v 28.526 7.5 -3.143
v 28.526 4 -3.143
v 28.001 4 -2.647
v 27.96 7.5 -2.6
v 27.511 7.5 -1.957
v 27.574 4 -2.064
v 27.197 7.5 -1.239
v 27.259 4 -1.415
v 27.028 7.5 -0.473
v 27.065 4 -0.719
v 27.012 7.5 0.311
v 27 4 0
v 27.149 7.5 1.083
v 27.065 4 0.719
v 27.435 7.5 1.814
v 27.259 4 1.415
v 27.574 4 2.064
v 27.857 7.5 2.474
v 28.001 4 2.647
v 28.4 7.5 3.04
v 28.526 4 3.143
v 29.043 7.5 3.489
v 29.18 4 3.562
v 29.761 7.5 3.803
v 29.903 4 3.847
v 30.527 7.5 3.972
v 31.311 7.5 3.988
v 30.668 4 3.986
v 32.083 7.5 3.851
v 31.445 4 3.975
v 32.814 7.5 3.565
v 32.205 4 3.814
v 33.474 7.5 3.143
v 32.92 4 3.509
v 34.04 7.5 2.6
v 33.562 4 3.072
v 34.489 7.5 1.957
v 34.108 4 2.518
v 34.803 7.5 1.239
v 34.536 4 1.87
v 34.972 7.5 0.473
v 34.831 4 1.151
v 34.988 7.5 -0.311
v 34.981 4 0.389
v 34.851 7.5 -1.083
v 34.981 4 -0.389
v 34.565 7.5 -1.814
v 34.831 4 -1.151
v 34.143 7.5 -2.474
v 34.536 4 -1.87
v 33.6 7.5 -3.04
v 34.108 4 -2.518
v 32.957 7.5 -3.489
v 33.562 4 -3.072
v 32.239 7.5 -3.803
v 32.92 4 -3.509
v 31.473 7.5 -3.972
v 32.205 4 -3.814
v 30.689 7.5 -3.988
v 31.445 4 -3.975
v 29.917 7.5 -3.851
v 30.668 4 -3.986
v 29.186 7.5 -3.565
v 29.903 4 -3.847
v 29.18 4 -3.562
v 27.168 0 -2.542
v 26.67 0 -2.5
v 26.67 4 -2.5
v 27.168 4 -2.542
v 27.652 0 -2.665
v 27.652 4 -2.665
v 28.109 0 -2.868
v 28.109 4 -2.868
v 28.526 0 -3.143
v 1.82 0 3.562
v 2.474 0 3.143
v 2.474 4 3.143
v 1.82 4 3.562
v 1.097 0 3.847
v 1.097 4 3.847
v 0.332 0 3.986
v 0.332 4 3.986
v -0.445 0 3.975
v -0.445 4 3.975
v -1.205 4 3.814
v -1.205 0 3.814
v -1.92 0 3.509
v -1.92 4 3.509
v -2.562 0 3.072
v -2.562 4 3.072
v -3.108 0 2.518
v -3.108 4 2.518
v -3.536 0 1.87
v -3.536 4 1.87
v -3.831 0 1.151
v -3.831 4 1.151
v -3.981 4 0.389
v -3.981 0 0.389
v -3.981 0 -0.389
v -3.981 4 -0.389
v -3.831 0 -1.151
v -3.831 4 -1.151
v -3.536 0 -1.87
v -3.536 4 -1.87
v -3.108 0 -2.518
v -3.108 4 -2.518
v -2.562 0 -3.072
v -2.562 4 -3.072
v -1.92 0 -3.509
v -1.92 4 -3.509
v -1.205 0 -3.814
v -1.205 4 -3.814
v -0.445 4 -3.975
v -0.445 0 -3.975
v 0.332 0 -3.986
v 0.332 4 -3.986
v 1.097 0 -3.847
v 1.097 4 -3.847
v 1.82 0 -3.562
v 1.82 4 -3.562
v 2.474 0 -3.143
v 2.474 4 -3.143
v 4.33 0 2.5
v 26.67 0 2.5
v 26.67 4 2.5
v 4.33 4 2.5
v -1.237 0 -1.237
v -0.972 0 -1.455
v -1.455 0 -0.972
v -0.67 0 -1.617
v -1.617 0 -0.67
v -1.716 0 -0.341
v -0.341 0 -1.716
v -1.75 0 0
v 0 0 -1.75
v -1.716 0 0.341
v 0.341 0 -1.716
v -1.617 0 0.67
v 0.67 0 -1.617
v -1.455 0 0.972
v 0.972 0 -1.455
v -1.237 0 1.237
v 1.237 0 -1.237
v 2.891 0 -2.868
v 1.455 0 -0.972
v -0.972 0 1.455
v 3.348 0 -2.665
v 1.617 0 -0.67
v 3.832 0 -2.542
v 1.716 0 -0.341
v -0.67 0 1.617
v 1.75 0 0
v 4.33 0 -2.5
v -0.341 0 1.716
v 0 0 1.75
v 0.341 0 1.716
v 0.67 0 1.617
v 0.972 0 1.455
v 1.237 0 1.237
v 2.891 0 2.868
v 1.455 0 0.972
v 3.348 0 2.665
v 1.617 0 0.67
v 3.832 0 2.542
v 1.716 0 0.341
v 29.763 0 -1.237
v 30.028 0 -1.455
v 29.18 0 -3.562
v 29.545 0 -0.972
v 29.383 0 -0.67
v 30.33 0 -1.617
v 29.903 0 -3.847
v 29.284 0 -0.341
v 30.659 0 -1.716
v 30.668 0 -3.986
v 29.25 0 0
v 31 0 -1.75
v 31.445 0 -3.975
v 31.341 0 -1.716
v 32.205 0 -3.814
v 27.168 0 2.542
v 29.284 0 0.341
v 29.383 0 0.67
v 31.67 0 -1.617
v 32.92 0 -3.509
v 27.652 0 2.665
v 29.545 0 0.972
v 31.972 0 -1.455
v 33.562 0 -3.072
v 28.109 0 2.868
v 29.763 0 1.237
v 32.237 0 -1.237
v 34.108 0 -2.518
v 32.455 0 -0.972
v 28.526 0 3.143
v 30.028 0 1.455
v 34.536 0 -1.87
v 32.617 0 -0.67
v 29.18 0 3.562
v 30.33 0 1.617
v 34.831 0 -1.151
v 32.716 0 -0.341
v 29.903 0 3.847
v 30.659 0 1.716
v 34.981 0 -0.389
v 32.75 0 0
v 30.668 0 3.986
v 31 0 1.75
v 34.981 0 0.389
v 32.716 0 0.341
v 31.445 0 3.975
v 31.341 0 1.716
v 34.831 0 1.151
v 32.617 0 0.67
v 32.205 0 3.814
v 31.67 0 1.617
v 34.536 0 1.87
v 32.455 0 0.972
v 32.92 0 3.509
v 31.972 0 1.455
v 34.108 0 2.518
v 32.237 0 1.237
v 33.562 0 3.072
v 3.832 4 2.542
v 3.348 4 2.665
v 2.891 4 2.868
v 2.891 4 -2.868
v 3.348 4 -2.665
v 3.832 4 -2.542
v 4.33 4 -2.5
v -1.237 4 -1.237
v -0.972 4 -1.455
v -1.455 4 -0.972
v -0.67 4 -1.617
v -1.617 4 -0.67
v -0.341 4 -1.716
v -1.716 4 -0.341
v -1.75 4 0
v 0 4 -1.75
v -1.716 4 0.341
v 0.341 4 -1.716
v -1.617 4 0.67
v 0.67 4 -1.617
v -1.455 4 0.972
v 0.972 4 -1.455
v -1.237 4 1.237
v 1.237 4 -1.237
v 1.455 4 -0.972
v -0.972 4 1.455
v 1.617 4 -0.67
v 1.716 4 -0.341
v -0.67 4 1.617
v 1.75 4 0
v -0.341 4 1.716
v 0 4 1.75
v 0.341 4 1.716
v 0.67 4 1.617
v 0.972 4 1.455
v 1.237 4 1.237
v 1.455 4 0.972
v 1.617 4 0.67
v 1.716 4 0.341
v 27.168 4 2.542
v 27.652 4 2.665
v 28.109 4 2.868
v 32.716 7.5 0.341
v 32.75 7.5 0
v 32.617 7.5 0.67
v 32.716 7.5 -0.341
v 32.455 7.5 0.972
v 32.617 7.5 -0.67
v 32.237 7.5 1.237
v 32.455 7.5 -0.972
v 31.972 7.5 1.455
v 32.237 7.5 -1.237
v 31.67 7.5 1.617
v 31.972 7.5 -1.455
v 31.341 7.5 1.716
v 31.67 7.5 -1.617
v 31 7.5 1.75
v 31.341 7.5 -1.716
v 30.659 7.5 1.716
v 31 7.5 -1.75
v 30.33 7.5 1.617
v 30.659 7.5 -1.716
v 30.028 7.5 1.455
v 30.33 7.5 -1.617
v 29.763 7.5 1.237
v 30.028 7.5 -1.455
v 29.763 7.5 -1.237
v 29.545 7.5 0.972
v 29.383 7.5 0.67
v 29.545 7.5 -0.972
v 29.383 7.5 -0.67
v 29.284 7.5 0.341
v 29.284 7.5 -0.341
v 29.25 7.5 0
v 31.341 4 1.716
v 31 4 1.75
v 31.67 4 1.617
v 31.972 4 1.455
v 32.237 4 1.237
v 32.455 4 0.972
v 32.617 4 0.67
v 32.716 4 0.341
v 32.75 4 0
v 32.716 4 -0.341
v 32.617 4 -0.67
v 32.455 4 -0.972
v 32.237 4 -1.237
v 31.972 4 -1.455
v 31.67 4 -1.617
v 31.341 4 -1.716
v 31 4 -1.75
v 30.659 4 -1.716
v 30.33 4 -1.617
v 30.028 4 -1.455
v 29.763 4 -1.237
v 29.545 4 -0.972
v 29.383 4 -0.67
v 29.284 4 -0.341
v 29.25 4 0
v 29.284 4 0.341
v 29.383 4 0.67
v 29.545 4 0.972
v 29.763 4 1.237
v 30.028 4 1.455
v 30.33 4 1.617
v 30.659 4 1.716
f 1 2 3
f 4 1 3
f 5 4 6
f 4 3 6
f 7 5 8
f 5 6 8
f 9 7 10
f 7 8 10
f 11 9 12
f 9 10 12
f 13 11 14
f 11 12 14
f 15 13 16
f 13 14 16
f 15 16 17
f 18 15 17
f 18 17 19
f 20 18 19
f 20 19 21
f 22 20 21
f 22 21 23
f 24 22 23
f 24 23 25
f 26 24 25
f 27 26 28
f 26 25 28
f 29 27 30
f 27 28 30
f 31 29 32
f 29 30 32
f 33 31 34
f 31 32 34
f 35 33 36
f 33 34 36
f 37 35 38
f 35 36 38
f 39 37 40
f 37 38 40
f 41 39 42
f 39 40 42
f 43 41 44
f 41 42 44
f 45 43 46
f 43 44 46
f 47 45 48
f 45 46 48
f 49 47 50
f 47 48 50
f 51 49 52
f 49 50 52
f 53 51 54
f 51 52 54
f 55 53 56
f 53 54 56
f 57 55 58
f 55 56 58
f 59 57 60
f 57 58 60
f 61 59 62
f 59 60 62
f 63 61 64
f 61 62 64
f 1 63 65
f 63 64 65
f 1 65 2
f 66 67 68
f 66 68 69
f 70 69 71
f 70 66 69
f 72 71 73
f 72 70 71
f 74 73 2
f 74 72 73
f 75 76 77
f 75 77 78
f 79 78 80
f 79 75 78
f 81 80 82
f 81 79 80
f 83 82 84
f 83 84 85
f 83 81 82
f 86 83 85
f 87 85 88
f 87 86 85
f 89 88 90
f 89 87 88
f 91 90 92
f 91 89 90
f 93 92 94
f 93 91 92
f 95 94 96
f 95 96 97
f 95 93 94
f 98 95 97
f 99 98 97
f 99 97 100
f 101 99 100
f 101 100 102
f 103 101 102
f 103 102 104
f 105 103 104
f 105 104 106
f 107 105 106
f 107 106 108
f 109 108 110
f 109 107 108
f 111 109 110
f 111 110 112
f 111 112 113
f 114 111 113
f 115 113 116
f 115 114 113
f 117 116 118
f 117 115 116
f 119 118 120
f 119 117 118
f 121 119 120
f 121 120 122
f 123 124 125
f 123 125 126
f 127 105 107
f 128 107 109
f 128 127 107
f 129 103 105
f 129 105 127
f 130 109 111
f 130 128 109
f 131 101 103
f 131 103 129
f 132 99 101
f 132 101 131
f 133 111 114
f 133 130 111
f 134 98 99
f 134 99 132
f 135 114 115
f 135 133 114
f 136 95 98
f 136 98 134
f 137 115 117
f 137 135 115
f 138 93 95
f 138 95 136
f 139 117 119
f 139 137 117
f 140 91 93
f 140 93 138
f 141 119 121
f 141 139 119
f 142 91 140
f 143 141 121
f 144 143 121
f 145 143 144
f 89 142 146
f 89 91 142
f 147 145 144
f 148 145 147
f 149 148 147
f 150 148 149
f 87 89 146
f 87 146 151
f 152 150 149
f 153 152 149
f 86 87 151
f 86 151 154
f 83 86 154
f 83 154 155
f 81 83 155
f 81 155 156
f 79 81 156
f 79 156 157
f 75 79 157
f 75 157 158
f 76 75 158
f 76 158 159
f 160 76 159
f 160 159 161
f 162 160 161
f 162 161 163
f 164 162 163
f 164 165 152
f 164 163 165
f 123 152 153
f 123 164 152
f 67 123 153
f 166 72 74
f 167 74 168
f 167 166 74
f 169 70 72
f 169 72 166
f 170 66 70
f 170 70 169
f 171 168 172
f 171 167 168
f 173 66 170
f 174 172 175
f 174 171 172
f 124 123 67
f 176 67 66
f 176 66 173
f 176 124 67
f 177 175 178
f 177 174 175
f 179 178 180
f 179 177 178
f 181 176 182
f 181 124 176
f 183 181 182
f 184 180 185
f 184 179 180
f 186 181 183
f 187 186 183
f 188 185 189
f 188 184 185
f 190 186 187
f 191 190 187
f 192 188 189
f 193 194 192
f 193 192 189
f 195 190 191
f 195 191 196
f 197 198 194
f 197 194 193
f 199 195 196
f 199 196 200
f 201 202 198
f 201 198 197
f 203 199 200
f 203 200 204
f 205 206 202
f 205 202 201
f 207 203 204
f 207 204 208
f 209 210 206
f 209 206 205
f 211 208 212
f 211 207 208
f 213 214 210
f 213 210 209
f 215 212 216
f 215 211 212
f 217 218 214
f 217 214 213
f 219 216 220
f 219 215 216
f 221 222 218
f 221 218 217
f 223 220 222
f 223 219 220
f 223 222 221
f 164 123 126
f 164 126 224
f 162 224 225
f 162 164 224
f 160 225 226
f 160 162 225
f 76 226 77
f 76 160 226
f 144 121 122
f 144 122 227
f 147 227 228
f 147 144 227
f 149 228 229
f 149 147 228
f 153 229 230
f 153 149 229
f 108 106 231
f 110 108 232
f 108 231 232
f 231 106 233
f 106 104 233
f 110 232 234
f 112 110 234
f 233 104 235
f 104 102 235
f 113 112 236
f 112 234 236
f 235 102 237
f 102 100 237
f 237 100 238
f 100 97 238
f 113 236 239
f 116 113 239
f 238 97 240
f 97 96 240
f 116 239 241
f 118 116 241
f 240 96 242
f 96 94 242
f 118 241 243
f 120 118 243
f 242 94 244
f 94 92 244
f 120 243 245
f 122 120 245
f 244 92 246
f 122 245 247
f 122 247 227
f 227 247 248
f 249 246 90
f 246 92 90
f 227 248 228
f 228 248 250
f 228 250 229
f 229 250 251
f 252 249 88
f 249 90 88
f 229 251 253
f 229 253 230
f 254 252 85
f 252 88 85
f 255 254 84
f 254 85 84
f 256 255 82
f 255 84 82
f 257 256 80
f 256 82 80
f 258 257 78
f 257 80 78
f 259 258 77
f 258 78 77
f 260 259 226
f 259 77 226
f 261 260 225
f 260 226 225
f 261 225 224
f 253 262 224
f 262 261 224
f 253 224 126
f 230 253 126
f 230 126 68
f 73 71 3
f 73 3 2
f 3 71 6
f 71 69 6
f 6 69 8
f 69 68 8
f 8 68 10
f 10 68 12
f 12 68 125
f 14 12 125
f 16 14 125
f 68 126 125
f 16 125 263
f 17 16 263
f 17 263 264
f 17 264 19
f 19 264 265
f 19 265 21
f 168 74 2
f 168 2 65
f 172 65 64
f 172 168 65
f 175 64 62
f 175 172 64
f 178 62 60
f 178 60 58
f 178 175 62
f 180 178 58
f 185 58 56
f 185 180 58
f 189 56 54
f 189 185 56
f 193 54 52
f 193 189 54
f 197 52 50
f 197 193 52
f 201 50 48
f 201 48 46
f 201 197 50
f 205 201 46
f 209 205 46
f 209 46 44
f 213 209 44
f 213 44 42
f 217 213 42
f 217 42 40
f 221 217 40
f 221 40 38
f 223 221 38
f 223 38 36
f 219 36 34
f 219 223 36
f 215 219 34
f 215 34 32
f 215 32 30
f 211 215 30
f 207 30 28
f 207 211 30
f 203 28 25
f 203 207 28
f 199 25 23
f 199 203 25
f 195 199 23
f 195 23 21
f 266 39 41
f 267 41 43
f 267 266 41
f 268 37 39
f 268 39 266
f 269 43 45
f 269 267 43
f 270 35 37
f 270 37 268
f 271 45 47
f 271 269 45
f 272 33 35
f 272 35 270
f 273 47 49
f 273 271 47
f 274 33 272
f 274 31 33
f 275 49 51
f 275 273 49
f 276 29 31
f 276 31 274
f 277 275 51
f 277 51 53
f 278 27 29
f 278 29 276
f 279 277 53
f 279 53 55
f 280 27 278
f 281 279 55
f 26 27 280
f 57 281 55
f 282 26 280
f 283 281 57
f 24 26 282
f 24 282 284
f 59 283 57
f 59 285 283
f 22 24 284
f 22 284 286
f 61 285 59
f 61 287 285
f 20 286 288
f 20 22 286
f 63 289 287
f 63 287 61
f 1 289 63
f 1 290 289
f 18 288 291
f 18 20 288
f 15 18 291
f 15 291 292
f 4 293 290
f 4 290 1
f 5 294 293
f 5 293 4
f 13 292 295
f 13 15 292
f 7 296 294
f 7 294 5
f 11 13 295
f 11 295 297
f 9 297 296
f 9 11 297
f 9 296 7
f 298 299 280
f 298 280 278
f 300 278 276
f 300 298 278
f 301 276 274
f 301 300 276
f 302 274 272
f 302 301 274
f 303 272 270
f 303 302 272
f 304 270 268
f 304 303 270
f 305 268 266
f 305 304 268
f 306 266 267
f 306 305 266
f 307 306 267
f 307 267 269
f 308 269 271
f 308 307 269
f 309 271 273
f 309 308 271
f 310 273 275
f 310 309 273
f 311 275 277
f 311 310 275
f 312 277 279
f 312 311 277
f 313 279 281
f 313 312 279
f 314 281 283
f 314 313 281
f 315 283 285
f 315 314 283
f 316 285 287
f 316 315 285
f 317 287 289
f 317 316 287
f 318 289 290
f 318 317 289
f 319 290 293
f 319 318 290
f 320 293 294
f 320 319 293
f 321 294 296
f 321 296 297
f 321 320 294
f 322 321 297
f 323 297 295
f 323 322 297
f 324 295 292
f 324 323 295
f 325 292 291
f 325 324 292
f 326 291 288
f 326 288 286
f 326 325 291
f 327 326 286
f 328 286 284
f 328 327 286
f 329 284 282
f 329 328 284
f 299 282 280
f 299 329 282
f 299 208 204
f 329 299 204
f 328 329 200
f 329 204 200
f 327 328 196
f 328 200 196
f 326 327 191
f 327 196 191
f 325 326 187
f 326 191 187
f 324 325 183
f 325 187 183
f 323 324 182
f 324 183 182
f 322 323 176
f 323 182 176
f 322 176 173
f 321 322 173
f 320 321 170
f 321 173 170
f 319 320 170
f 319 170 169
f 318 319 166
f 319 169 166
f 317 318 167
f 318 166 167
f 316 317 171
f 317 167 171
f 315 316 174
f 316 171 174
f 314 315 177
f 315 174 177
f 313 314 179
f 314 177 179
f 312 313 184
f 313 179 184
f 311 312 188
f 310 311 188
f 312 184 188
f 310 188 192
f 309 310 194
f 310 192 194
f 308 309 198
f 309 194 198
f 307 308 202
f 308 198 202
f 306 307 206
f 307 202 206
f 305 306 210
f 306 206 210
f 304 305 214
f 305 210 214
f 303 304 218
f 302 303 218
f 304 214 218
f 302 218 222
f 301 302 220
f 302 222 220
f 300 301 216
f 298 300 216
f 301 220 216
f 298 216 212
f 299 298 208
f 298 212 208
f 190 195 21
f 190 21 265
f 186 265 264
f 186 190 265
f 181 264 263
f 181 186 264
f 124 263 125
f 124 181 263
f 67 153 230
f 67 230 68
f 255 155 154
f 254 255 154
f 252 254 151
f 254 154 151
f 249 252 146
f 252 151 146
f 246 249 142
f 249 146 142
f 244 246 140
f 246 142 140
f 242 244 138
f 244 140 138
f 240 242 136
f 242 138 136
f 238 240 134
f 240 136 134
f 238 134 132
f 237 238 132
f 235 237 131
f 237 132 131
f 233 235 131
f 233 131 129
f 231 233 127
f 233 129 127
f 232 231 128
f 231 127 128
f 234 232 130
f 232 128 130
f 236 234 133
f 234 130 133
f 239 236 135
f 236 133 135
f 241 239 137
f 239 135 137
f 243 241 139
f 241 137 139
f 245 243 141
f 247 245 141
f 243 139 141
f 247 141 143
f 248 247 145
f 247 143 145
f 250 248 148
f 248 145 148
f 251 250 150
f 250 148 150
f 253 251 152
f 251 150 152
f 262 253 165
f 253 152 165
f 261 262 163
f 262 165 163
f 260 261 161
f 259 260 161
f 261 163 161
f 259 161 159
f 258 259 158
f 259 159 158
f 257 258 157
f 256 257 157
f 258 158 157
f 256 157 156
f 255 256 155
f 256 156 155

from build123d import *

# Parameters (mm, degrees)
SKETCH1_R           = 1.75
BOSS_EXTRUDE1_DEPTH = 4
SKETCH2_R           = 4
SKETCH2_R_2         = 1.75
BOSS_EXTRUDE2_DEPTH = 3.5


with BuildPart() as part:
    # Sketch1 → Boss-Extrude1 (new body)
    with BuildSketch(Plane.XZ):
        with BuildLine():
            Line((26.669872981, 2.5), (4.330127019, 2.5))
            ThreePointArc((4.330127019, 2.5), (3.348146513, 2.665266452), (2.474358297, 3.142857143))
            ThreePointArc((2.474358297, 3.142857143), (-4, 0), (2.474358297, -3.142857143))
            ThreePointArc((2.474358297, -3.142857143), (3.348146513, -2.665266452), (4.330127019, -2.5))
            Line((4.330127019, -2.5), (26.669872981, -2.5))
            ThreePointArc((26.669872981, -2.5), (27.651853487, -2.665266452), (28.525641703, -3.142857143))
            ThreePointArc((28.525641703, -3.142857143), (35, 0), (28.525641703, 3.142857143))
            ThreePointArc((28.525641703, 3.142857143), (27.651853487, 2.665266452), (26.669872981, 2.5))
        make_face()
        with Locations(Location((31, 0, 0), (0, 0, 90))):
            Circle(SKETCH1_R, mode=Mode.SUBTRACT)
        with Locations(Location((0, 0, 0), (0, 0, 90))):
            Circle(SKETCH1_R, mode=Mode.SUBTRACT)
    extrude(amount=-BOSS_EXTRUDE1_DEPTH)

    # Sketch2 → Boss-Extrude2 (add)
    with BuildSketch(Plane(origin=(0, 4, 0), x_dir=(1, 0, 0), z_dir=(0, 1, 0))):
        with Locations(Location((31, 0, 0), (0, 0, 128.213210702))):
            Circle(SKETCH2_R)
        with Locations(Location((31, 0, 0), (0, 0, 270))):
            Circle(SKETCH2_R_2, mode=Mode.SUBTRACT)
    extrude(amount=BOSS_EXTRUDE2_DEPTH)


solid = part.part
